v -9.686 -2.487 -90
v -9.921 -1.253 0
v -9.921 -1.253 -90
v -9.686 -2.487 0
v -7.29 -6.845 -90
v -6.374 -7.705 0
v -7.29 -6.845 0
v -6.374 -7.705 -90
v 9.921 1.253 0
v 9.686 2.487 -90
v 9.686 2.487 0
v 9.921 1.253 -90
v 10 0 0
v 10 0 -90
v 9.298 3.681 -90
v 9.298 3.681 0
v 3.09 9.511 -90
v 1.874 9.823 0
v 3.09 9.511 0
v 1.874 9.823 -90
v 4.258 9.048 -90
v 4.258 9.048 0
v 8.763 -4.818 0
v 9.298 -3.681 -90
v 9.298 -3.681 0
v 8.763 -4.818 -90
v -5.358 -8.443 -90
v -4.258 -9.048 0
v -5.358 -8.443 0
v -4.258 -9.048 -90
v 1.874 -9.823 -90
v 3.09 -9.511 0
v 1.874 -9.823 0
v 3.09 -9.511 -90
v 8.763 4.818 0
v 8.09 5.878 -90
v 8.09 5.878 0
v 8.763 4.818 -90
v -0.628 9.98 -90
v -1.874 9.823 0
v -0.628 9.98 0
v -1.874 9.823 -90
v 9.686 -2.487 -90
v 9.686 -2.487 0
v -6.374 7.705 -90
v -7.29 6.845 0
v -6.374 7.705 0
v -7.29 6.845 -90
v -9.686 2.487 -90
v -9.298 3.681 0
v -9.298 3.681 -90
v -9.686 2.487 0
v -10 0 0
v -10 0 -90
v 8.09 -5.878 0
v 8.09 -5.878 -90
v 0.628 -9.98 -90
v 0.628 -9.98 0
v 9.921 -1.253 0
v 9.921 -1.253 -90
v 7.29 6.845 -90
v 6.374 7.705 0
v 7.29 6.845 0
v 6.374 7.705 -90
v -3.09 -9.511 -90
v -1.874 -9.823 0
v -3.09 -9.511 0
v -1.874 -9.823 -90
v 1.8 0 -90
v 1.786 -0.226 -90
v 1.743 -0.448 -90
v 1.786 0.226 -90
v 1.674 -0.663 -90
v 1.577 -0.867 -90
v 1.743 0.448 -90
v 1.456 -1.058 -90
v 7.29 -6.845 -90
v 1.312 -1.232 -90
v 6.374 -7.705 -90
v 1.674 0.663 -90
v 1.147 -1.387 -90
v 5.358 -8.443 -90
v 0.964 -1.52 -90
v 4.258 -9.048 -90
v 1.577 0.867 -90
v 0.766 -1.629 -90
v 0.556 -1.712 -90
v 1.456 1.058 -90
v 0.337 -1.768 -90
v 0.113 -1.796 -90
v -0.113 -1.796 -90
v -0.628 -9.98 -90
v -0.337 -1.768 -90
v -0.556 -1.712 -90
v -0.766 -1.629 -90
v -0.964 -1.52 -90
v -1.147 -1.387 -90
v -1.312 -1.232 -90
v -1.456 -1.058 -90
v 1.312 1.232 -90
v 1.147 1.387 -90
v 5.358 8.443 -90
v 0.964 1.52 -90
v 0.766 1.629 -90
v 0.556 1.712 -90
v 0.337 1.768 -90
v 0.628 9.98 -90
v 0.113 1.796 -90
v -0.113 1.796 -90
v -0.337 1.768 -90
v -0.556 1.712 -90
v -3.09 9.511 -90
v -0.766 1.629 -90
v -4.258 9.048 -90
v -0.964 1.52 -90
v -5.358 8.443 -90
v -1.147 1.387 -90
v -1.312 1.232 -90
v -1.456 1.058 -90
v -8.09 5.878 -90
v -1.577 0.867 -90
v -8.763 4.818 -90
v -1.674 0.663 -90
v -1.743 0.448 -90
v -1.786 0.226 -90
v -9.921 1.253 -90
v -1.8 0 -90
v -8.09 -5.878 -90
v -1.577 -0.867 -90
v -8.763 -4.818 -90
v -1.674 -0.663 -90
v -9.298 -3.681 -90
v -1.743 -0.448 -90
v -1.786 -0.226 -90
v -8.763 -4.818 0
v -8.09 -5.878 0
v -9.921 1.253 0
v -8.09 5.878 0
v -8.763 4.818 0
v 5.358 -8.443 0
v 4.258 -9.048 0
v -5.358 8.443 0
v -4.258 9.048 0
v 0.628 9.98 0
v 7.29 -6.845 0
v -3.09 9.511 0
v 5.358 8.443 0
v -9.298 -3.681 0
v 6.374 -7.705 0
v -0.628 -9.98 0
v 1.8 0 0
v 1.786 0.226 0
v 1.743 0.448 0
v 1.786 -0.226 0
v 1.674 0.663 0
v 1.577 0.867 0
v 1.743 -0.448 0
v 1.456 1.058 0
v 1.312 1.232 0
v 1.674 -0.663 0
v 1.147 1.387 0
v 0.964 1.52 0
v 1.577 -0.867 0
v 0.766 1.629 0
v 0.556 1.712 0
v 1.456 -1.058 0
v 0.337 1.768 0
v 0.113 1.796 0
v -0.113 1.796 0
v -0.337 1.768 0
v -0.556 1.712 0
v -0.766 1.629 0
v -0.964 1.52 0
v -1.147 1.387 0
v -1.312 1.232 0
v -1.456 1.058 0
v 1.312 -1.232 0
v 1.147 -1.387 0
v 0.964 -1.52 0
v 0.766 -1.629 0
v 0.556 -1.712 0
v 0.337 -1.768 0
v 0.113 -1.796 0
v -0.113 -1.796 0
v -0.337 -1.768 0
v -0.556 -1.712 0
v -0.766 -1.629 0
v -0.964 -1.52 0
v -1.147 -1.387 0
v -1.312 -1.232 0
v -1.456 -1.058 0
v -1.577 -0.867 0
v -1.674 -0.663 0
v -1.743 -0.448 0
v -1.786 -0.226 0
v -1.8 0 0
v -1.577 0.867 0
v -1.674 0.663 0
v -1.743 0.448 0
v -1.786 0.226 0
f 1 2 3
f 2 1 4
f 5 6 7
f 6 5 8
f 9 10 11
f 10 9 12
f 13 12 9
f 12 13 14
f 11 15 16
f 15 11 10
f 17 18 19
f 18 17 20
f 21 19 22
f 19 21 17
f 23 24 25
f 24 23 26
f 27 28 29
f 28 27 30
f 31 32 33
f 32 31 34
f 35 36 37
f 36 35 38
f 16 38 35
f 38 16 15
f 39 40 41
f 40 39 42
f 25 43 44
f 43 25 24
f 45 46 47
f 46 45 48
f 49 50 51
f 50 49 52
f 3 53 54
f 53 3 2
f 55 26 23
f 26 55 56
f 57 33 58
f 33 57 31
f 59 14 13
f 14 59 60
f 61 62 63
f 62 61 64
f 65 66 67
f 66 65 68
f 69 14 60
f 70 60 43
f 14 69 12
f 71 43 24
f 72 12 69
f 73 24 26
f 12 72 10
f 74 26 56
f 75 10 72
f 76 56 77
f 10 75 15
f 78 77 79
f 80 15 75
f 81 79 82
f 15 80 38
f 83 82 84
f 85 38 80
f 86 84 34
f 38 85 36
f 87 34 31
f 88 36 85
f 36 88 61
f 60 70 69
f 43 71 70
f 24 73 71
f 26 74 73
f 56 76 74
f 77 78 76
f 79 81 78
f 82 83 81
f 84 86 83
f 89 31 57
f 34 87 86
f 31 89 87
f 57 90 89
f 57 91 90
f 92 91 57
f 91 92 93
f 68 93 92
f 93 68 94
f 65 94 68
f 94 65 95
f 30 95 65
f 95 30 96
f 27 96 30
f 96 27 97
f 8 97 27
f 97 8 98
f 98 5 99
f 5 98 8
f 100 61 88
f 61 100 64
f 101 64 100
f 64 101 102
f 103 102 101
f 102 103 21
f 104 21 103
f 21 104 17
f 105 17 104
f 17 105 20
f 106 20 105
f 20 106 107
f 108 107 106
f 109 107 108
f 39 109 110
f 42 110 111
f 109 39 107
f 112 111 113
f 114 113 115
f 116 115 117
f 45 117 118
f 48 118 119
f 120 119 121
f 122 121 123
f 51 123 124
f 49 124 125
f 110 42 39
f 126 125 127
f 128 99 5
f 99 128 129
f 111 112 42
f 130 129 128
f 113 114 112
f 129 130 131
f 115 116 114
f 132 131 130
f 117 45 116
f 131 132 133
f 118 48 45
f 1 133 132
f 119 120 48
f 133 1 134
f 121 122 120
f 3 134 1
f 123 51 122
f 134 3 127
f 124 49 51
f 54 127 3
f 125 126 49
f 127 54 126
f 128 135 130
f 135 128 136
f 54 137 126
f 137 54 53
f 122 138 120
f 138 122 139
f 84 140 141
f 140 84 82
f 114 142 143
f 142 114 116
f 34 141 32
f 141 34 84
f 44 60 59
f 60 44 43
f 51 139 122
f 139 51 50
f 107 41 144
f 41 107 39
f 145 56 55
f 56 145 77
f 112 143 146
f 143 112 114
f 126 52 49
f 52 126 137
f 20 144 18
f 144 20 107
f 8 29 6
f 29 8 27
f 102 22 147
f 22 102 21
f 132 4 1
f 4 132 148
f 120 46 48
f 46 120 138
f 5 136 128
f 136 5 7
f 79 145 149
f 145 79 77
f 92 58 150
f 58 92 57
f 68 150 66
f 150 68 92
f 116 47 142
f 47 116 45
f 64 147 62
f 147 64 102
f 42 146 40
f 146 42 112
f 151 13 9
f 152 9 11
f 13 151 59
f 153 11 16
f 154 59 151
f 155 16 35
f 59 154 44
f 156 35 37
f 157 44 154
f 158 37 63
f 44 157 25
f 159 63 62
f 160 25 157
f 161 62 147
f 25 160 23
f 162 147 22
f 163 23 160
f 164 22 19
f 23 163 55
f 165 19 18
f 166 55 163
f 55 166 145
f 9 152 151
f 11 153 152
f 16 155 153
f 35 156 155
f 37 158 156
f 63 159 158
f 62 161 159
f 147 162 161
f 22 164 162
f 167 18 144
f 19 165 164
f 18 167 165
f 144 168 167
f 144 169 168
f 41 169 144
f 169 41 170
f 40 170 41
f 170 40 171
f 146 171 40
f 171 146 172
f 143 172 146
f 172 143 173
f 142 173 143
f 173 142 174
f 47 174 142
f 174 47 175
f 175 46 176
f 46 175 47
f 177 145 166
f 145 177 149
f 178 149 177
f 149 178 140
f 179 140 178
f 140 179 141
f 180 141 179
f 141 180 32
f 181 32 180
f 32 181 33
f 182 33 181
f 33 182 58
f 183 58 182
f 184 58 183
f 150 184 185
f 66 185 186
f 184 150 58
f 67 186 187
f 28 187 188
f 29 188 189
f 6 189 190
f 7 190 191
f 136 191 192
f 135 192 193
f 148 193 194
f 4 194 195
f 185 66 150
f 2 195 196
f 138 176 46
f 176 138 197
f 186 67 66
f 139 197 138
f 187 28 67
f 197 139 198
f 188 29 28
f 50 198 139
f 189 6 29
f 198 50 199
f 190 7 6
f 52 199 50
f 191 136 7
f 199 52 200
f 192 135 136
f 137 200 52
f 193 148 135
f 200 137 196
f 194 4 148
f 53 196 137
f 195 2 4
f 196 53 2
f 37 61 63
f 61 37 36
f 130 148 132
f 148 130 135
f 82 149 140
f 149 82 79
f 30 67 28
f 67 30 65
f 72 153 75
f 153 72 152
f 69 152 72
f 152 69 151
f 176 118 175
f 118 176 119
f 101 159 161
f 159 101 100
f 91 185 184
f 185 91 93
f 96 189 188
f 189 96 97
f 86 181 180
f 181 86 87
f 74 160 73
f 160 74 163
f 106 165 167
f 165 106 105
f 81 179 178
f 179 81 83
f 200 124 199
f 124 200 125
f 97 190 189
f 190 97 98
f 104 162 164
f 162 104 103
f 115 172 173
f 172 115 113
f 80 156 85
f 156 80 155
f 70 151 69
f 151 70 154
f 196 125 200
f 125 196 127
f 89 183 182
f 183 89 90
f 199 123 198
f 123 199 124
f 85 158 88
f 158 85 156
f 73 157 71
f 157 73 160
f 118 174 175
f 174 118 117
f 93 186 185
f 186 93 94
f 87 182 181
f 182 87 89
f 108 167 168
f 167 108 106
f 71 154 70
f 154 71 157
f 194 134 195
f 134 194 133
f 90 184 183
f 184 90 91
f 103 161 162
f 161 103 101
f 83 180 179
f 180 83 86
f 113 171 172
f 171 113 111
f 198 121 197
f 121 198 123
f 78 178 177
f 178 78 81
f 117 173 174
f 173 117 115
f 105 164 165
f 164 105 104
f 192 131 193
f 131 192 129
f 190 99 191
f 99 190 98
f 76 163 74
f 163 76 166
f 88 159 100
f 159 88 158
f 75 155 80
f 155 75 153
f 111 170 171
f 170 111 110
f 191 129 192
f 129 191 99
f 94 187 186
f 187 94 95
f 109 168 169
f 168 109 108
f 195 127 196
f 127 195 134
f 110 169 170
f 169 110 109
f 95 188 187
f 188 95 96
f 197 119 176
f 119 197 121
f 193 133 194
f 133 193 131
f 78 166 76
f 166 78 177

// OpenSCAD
$fn = 50;


difference() {
	union() {
		translate(v = [0, 0, -90.0000000000]) {
			cylinder(h = 90, r = 10.0000000000);
		}
		cylinder(h = 0, r = 13.0000000000);
	}
	union() {
		#translate(v = [0, 0, -90]) {
			cylinder(h = 90, r = 1.8000000000);
		}
	}
}
